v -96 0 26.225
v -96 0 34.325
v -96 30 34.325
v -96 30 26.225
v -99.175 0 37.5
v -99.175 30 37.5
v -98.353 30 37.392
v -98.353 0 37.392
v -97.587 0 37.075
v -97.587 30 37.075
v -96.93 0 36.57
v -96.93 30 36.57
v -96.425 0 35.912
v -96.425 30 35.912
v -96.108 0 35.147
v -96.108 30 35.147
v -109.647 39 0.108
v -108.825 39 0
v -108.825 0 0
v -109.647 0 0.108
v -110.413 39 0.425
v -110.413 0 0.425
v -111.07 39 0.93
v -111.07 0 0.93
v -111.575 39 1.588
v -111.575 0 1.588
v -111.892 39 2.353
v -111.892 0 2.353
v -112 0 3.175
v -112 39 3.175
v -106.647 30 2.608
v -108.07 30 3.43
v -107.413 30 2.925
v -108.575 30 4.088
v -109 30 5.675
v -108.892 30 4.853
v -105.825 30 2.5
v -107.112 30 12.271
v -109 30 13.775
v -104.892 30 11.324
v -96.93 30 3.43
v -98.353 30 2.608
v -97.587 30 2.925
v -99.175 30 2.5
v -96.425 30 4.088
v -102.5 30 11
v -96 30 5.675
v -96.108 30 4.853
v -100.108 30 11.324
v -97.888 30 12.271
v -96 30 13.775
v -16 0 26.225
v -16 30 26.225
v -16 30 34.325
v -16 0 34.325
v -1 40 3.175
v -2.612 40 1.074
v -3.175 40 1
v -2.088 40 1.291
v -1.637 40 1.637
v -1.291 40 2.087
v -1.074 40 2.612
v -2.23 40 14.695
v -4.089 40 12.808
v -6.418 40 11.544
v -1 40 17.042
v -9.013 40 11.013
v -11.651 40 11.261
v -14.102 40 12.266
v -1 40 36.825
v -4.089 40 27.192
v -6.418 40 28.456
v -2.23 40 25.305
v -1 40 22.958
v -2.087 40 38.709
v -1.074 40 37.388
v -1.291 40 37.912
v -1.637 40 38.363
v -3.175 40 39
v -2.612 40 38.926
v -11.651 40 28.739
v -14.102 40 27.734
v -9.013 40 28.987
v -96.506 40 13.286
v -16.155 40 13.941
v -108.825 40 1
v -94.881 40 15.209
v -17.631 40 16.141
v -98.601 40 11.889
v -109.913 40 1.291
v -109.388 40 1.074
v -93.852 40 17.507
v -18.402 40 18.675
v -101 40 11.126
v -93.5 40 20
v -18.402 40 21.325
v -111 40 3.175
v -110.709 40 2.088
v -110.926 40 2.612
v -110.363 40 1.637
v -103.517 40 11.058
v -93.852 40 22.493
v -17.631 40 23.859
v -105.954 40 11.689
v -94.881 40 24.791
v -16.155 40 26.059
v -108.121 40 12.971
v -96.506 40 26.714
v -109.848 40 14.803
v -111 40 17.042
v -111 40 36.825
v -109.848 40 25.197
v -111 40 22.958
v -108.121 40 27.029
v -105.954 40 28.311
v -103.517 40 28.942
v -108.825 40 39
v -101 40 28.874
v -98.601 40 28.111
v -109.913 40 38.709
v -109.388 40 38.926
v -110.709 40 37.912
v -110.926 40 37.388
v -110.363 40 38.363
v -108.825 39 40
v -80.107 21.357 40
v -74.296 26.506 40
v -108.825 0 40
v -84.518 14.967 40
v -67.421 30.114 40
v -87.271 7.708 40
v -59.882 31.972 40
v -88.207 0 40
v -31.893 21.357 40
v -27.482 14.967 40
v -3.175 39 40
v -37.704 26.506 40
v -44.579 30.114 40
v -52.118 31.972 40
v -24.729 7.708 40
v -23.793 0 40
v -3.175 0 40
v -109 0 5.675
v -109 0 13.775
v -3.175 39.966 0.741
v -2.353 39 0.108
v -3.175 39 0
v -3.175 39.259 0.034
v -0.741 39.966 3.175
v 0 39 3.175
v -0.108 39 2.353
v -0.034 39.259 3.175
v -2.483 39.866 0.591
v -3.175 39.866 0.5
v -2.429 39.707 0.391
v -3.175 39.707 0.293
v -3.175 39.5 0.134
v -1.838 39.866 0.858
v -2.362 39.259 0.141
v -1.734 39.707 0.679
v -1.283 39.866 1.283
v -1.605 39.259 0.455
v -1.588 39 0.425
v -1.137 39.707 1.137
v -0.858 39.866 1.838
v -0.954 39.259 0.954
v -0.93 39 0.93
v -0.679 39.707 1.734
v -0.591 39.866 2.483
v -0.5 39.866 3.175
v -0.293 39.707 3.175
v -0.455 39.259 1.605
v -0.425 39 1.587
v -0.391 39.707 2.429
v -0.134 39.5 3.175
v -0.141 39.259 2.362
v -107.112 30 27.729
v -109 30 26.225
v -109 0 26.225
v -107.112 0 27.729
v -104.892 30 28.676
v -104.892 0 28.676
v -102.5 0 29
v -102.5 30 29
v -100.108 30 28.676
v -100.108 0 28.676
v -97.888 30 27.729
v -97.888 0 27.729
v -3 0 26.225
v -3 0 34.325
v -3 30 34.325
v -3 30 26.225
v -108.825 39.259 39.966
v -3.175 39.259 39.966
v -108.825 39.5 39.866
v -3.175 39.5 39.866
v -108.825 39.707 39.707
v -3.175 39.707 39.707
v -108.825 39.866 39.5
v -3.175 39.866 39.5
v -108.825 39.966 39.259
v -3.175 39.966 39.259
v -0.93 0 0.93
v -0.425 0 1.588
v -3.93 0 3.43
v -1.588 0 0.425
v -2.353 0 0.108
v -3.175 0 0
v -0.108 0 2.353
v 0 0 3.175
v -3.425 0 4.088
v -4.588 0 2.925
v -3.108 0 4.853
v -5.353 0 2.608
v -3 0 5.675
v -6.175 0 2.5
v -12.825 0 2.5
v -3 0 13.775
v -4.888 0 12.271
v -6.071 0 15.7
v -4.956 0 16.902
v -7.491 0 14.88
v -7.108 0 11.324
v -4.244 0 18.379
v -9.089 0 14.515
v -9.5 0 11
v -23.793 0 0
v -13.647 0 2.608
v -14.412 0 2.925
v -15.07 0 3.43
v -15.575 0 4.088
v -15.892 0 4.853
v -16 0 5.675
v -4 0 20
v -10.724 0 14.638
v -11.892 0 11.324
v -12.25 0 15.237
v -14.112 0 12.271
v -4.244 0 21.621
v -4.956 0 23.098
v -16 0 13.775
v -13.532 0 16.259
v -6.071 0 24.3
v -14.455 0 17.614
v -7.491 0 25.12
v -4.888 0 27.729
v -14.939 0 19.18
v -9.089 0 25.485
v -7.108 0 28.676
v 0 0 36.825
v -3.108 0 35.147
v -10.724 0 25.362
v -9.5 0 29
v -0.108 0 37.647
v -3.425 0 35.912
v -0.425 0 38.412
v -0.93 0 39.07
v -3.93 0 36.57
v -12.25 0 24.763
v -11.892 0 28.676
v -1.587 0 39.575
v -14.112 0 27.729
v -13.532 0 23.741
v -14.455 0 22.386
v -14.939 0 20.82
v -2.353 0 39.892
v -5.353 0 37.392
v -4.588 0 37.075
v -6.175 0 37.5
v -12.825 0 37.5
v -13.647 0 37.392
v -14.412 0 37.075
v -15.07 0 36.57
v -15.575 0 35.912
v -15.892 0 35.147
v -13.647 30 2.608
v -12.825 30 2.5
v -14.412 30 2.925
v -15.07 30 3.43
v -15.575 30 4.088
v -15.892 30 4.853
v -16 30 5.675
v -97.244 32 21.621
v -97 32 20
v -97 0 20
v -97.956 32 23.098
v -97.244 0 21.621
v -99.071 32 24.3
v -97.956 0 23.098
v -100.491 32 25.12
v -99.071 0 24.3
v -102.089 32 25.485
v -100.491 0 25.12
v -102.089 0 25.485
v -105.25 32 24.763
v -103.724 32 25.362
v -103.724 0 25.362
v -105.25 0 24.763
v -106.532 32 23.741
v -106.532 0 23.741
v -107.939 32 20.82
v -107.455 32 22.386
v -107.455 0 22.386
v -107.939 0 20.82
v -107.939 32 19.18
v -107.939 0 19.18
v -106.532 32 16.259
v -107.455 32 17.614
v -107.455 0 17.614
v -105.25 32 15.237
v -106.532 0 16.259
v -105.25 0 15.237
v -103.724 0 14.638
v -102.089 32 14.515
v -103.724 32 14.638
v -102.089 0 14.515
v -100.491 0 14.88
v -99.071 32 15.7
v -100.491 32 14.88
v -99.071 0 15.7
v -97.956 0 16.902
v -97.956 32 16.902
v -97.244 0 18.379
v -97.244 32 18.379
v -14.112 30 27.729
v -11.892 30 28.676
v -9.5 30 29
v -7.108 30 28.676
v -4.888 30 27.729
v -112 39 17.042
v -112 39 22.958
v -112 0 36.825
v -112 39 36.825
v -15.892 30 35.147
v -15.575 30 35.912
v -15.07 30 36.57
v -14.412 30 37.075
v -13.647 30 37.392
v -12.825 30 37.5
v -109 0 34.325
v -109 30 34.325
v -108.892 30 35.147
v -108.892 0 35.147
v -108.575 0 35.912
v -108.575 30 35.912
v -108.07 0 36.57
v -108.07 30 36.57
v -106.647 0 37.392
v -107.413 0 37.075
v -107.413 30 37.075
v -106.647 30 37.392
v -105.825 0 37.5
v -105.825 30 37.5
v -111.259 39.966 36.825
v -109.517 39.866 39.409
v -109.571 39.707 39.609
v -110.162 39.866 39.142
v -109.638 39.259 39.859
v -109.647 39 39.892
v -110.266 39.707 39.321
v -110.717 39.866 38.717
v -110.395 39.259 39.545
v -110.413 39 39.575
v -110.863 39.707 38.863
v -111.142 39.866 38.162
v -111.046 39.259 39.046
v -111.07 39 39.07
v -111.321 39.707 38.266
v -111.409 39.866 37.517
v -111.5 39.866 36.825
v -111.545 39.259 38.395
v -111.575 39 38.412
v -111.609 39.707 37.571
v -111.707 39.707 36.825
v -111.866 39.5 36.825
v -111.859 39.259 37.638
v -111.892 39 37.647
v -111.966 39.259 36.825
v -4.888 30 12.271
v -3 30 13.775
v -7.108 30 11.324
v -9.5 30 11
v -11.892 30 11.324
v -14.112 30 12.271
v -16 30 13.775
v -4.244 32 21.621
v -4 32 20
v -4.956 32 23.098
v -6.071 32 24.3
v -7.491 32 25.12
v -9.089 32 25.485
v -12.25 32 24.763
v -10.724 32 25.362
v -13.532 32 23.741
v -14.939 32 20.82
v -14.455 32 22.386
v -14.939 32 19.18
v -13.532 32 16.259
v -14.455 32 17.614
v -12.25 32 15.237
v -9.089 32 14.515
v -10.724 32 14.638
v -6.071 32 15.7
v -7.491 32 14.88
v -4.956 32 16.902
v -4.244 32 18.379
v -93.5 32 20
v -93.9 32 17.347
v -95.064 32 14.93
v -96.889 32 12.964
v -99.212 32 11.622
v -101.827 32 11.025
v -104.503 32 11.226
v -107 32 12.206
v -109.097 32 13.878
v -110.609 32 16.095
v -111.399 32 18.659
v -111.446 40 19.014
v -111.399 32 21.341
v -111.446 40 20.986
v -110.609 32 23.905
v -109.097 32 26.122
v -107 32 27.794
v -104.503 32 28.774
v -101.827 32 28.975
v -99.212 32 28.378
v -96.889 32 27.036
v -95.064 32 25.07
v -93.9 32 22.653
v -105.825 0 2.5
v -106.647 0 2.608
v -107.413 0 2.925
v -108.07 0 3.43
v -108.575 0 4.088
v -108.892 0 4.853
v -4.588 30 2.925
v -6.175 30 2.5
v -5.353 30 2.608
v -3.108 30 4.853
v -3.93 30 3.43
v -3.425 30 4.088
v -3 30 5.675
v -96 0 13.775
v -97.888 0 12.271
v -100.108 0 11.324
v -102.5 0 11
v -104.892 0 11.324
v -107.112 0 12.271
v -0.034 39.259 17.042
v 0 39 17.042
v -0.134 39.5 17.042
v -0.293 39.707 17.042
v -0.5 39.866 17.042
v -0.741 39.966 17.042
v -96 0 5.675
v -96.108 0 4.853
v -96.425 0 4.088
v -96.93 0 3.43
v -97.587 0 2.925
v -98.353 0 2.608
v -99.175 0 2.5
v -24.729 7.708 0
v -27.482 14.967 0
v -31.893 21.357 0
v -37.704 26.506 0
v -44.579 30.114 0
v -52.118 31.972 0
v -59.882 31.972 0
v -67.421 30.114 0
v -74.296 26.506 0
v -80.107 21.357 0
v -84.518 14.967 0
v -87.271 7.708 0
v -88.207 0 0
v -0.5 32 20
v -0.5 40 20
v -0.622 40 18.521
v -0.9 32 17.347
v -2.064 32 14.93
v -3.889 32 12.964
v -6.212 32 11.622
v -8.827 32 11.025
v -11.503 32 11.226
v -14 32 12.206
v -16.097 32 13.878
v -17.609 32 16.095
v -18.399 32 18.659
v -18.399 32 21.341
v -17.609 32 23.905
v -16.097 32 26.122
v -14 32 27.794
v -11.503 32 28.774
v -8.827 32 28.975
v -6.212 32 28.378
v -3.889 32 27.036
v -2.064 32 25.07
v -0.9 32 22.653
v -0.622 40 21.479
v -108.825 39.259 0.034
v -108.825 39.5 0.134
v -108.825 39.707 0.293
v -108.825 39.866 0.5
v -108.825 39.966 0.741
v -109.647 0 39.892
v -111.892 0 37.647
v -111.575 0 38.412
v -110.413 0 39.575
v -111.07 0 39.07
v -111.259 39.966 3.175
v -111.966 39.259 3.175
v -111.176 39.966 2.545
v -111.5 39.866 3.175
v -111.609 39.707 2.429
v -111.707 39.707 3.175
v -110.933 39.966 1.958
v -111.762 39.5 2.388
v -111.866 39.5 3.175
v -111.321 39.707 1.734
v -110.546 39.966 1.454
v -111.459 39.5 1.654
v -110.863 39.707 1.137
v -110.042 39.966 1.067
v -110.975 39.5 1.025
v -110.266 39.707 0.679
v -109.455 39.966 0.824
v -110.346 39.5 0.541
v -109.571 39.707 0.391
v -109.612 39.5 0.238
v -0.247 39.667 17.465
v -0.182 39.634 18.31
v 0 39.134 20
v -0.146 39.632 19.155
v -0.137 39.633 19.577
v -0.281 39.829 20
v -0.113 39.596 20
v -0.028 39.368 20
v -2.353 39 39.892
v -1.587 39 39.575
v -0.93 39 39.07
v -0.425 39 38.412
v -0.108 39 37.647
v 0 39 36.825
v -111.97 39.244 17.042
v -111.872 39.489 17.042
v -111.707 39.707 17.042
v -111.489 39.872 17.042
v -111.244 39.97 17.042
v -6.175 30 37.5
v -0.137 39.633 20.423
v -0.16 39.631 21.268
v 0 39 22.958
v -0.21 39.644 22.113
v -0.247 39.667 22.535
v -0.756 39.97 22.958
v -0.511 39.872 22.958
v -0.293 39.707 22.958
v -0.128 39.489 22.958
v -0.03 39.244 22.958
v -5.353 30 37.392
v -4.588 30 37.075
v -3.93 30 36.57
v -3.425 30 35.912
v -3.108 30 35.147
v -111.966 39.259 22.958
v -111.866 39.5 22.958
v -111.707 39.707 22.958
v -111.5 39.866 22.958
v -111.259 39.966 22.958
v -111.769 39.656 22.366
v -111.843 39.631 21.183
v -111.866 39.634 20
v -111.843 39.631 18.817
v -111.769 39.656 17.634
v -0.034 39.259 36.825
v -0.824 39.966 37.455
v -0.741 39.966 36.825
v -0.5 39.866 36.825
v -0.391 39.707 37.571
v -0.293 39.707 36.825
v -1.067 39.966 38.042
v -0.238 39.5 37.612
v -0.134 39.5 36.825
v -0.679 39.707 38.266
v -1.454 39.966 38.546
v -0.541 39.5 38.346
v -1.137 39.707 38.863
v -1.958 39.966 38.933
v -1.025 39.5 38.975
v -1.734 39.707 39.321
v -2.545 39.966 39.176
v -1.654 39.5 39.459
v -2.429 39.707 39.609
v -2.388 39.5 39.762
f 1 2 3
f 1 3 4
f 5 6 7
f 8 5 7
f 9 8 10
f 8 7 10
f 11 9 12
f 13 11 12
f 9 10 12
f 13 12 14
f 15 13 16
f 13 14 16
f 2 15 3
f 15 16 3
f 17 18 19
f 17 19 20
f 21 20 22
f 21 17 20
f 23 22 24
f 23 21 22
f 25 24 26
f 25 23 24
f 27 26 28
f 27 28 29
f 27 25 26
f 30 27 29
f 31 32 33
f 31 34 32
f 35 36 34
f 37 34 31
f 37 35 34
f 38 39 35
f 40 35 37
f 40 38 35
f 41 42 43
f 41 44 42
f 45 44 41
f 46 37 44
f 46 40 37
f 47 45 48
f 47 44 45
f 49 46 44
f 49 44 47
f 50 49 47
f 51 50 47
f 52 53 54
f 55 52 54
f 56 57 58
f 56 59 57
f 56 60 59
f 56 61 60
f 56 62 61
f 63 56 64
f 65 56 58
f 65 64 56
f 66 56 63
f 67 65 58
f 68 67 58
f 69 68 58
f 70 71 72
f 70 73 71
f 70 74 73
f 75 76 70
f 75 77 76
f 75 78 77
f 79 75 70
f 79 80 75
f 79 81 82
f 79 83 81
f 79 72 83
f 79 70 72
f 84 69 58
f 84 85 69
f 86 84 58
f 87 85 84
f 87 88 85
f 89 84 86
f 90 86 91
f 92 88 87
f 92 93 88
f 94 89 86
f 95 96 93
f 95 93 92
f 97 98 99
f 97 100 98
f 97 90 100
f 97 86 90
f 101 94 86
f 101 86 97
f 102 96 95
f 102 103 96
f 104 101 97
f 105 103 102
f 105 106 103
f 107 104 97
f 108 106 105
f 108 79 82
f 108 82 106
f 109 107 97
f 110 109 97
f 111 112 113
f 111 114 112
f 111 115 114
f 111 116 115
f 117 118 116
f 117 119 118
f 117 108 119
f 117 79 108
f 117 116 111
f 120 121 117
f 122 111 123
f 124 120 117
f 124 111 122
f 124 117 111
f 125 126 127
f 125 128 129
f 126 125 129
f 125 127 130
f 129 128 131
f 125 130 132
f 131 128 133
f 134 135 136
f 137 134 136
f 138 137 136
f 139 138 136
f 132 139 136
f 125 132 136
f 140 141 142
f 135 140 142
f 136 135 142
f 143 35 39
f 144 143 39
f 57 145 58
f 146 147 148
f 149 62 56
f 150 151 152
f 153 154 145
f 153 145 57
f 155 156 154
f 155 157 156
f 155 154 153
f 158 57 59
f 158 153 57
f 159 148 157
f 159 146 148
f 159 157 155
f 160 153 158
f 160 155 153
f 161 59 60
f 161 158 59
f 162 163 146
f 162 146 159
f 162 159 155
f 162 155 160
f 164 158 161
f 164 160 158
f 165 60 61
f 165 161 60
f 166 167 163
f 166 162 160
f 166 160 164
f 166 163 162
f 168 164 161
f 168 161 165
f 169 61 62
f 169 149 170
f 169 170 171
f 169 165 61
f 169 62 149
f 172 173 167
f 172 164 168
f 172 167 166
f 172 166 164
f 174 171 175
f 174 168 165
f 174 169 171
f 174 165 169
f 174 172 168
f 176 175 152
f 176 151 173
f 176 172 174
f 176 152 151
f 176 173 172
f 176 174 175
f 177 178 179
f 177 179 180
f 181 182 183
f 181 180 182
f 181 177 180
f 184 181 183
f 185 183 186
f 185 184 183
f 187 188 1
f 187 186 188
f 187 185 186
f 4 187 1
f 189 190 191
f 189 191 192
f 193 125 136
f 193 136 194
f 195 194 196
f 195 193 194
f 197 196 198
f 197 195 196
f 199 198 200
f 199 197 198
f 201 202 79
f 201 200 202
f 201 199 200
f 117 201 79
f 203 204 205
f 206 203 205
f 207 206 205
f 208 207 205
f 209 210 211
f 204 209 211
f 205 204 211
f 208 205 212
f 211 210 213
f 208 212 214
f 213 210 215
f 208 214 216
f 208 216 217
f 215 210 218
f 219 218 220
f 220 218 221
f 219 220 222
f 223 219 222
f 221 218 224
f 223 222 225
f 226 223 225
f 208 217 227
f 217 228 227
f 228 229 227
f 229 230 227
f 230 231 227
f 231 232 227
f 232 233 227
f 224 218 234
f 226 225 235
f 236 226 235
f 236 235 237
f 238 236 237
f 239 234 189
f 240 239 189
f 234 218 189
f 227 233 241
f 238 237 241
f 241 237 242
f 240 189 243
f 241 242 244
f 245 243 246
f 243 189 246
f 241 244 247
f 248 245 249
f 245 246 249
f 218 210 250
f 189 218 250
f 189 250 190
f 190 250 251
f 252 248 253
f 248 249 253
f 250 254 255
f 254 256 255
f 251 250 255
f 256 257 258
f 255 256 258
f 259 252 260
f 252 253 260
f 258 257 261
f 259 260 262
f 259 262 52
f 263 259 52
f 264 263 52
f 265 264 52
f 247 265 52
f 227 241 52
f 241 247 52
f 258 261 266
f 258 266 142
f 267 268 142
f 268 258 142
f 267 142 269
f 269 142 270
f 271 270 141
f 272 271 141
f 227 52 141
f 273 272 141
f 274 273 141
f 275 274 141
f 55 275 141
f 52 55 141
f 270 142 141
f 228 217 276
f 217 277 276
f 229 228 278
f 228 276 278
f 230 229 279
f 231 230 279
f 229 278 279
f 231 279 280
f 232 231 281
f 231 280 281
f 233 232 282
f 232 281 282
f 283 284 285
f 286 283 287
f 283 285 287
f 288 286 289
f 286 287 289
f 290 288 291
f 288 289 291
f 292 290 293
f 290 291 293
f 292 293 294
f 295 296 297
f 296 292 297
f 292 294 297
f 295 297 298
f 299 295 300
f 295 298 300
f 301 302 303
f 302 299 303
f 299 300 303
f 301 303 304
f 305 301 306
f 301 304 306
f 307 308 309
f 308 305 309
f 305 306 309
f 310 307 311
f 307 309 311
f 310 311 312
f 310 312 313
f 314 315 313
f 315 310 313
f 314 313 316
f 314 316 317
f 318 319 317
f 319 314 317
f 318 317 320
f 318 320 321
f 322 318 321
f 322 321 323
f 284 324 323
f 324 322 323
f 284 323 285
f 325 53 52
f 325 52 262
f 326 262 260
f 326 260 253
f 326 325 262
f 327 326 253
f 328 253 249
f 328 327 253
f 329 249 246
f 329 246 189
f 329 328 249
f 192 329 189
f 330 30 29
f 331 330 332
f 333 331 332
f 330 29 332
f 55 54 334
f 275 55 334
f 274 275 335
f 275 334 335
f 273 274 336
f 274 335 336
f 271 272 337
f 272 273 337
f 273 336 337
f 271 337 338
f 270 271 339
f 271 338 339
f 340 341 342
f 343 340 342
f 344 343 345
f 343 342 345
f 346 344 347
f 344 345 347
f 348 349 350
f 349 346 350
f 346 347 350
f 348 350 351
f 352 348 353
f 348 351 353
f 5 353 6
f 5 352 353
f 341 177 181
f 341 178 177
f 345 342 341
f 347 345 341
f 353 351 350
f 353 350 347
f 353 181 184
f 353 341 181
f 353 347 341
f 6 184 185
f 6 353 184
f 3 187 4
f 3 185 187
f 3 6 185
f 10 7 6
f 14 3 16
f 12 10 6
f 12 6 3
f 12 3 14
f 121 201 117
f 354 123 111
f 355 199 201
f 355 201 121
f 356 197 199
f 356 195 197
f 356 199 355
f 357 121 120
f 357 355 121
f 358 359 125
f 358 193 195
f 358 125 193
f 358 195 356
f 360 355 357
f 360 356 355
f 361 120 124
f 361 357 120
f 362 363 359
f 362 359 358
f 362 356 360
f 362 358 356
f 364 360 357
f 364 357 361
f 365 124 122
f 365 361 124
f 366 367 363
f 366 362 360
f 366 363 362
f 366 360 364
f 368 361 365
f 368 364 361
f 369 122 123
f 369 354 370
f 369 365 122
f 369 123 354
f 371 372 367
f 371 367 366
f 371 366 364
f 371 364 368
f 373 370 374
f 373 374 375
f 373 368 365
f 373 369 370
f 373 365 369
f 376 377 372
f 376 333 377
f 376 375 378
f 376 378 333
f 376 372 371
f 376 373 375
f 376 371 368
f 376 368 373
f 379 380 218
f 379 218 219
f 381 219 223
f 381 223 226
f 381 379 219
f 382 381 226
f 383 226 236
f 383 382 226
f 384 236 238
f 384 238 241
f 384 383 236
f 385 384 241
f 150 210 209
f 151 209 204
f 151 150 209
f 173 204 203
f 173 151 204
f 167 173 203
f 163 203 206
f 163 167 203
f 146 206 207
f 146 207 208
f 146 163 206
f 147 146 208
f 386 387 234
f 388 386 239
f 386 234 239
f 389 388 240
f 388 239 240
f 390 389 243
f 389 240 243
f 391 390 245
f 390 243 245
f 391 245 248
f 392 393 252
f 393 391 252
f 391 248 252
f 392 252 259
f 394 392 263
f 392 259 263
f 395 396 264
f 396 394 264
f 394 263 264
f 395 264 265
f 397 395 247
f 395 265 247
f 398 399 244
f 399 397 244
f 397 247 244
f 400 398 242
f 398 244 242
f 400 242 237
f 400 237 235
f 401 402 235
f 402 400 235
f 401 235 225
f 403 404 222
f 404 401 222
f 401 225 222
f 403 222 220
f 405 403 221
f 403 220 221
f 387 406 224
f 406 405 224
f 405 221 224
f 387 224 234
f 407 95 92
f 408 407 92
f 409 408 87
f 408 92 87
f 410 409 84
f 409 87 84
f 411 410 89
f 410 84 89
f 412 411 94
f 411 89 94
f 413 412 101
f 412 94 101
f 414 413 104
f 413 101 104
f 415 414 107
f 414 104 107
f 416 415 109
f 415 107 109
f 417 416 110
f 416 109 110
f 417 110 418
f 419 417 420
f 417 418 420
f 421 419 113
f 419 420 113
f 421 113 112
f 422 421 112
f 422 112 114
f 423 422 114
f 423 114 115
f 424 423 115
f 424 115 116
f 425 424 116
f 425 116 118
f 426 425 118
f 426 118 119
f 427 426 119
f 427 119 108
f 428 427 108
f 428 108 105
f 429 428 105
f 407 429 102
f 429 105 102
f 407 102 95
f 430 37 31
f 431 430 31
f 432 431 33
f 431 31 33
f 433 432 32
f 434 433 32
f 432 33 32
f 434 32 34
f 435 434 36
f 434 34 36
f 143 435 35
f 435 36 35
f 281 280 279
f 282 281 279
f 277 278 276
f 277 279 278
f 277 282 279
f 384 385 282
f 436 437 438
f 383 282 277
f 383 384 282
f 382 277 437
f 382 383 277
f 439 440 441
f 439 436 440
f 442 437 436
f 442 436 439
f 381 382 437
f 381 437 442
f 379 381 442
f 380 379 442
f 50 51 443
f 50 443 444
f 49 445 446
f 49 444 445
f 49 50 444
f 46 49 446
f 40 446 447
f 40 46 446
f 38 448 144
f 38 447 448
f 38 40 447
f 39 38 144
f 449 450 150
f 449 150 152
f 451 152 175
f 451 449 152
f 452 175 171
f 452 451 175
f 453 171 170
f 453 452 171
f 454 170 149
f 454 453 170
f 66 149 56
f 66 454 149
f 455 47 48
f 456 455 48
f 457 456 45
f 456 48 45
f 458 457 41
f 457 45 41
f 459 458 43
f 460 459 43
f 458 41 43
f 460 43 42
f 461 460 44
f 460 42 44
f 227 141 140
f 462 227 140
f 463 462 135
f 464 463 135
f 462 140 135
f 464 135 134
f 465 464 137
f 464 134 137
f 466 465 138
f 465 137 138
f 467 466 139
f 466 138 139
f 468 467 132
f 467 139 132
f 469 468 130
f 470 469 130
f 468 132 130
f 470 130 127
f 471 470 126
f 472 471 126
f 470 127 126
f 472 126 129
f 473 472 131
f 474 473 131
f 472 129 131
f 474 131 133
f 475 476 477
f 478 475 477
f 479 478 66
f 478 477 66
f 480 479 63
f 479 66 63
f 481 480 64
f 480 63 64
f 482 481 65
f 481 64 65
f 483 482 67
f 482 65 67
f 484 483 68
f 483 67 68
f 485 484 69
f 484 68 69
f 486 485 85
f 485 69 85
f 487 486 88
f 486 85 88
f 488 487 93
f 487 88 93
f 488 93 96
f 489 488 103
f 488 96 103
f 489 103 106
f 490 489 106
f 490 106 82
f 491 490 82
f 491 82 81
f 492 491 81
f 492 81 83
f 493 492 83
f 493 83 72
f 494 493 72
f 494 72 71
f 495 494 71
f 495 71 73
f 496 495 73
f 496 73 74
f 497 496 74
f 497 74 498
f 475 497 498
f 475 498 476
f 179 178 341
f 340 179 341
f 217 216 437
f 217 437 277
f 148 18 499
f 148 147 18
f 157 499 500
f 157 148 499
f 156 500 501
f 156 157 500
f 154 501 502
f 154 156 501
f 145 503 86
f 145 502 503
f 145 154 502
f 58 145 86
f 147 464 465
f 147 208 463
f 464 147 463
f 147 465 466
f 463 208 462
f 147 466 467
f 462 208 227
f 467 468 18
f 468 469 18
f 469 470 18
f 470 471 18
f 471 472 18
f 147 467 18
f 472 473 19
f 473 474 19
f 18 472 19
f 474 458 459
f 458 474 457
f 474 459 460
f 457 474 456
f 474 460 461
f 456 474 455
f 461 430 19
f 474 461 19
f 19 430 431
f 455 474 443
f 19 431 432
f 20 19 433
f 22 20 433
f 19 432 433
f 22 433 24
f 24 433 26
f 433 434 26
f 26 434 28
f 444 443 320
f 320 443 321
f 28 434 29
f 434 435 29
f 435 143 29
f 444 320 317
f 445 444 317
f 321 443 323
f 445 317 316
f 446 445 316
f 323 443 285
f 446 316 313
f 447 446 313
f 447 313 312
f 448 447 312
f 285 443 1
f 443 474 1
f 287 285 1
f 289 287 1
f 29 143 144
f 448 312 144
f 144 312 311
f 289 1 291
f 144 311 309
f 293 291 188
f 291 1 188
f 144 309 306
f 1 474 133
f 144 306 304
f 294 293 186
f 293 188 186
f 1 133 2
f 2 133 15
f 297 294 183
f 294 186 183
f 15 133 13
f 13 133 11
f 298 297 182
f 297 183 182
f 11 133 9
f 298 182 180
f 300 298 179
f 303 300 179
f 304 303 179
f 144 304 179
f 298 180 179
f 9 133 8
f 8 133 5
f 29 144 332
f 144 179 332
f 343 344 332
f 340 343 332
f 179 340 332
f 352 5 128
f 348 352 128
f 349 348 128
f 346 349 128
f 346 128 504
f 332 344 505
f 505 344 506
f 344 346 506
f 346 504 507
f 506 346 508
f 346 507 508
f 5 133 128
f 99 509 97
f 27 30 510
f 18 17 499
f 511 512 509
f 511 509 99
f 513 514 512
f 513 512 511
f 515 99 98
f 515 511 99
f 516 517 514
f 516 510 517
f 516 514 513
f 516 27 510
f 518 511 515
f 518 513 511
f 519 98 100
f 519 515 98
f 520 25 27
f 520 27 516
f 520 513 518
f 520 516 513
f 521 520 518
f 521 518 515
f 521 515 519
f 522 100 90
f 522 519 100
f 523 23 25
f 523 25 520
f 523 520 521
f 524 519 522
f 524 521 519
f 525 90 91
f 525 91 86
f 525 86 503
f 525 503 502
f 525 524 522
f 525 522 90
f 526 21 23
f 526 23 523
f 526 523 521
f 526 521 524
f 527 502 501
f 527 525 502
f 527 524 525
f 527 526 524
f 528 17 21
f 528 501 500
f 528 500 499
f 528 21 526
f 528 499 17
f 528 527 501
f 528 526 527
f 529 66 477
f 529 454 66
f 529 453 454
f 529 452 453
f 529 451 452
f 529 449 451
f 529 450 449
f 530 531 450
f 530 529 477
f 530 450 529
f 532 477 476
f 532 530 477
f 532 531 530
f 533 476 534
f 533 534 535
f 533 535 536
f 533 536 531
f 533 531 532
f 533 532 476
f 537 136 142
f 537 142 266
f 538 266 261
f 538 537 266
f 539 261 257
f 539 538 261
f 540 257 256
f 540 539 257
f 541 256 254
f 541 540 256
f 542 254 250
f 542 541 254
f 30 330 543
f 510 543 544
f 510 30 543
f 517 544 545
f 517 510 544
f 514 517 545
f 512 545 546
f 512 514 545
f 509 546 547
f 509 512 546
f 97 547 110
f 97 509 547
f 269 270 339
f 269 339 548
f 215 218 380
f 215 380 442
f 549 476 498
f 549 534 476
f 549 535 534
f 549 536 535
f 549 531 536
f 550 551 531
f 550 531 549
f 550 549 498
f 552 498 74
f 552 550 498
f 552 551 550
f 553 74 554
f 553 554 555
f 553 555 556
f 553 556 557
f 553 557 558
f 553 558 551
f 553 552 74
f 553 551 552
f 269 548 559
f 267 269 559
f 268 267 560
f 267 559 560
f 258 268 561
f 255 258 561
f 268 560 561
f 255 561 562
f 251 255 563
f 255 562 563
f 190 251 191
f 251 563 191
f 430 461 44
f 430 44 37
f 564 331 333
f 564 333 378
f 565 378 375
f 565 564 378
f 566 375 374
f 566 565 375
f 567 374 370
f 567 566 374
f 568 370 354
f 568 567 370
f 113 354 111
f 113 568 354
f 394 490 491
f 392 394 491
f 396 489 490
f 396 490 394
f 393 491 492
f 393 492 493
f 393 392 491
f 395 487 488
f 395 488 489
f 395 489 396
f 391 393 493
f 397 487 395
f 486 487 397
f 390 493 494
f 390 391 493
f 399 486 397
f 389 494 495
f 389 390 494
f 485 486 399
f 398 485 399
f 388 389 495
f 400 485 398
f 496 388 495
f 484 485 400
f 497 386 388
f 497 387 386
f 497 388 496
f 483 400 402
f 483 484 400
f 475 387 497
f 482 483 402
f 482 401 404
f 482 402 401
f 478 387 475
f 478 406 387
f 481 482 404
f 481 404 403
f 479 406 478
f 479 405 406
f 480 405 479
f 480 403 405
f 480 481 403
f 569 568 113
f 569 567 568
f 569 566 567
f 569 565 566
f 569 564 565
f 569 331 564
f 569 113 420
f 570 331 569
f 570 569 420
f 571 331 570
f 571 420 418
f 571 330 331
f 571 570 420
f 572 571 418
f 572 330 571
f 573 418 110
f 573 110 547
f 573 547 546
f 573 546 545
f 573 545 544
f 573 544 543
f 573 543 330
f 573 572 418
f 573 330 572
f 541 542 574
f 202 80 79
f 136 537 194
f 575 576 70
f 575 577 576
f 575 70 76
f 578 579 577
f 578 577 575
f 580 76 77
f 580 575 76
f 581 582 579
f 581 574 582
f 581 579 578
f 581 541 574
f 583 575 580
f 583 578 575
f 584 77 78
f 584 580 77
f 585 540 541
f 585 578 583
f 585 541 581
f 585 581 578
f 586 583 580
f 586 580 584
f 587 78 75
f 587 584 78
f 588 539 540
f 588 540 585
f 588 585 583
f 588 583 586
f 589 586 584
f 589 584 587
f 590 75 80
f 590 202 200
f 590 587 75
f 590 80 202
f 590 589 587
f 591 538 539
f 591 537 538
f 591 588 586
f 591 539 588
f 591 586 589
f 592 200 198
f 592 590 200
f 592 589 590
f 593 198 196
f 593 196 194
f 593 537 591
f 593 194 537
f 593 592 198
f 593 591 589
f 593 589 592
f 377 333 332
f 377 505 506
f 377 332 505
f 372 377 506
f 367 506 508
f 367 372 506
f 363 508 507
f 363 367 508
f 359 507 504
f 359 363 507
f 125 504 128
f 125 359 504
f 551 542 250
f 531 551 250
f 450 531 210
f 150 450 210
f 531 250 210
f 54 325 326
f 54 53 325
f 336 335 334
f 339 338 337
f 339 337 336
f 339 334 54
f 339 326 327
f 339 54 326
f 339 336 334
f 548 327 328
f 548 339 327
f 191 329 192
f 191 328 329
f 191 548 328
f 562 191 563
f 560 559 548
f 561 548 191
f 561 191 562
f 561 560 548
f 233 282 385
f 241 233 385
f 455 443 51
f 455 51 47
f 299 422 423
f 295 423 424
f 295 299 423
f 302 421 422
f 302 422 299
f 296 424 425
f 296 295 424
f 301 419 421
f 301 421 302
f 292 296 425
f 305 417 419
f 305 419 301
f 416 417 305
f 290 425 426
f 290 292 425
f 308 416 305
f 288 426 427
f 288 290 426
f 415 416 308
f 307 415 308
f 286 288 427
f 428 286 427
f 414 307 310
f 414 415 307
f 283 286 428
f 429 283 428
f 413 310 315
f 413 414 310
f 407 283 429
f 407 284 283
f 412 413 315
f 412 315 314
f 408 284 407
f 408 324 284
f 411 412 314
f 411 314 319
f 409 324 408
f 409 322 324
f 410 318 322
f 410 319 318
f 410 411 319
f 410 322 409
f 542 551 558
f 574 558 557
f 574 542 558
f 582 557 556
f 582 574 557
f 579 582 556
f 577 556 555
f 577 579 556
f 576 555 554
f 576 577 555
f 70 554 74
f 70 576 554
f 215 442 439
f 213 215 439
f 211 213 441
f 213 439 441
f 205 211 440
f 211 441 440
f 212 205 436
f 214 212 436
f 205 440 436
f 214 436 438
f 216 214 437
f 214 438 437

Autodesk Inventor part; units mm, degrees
ref_plane "YZ Plane" through (0, 0, 0) normal (1, 0, 0) x (0, 1, 0)
ref_plane "XZ Plane" through (0, 0, 0) normal (0, 1, 0) x (-1, 0, 0)
ref_plane "XY Plane" through (0, 0, 0) normal (0, 0, 1) x (1, 0, 0)
sketch "Sketch13" plane through (0, 0, 0) normal (0, 1, 0) x (-1, 0, 0)
  line L0 (0, 0) -> (112, 0)
  line L1 (112, 0) -> (112, 40)
  line L2 (112, 40) -> (0, 40)
  line L3 (0, 40) -> (0, 0)
  dimension "d51" = 112
  dimension "d52" = 40
extrude "Extrusion11" add sketch "Sketch13" along normal blind 40
sketch "Sketch14" plane through (-112, 0, 40) normal (0, 0, 1) x (1, 0, 0)
  line L0 (0, 0) -> (0, 40) projected
  arc A0 (88.2072, 0) -> (23.7928, 0) centre (56, 0) ccw
  line L1 (23.7928, 0) -> (88.2072, 0)
  dimension "d88" = 32.2072
extrude "Extrusion12" cut sketch "Sketch14" against normal blind 40
sketch "Sketch15" plane through (0, 0, 0) normal (0, -1, 0) x (1, 0, 0)
  line L0 (-88.2072, 0) -> (-88.2072, 40) projected
  line L1 (-112, 40) -> (-88.2072, 40) projected
  line L2 (-112, 0) -> (-112, 40) projected
  line L3 (-88.2072, 0) -> (-112, 0) projected
  line L4 (-100.1315, 0) -> (-100.1315, 2.5) construction
  line L5 (-101.9977, 40) -> (-101.9977, 37.5) construction
  line L6 (-112, 20) -> (-109, 20) construction
  line L7 (-88.2072, 20) -> (-94.2072, 20) construction
  line L8 (-109, 37.5) -> (-96, 37.5)
  line L9 (-96, 37.5) -> (-96, 2.5)
  line L10 (-96, 2.5) -> (-109, 2.5)
  line L11 (-109, 2.5) -> (-109, 37.5)
  line L12 (-23.7928, 40) -> (-23.7928, 0) projected
  line L13 (-23.7928, 40) -> (-23.7928, 0) projected
  line L14 (0, 0) -> (-23.7928, 0) projected
  line L15 (0, 40) -> (0, 0) projected
  line L16 (-23.7928, 40) -> (0, 40) projected
  line L17 (0, 20) -> (-3, 20) construction
  line L18 (-11.8964, 0) -> (-11.8964, 2.5) construction
  line L19 (-11.8964, 40) -> (-11.8964, 37.5) construction
  line L20 (-23.7928, 20) -> (-17.7928, 20) construction
  line L21 (-16, 37.5) -> (-3, 37.5)
  line L22 (-3, 37.5) -> (-3, 2.5)
  line L23 (-3, 2.5) -> (-16, 2.5)
  line L24 (-16, 2.5) -> (-16, 37.5)
  dimension "d60" = 2.5
  dimension "d62" = 2.5
  dimension "d63" = 3
  dimension "d64" = 6
  dimension "d65" = 3
  dimension "d66" = 2.5
  dimension "d67" = 2.5
  dimension "d68" = 6
extrude "Extrusion13" cut sketch "Sketch15" against normal blind 30 contours L8 L9 L10 L11 | L21 L22 L23 L24
sketch "Sketch16" plane through (0, 30, 0) normal (0, -1, 0) x (1, 0, 0)
  line L0 (-16, 37.5) -> (-3, 37.5) projected
  line L1 (-16, 2.5) -> (-16, 37.5) projected
  line L2 (-3, 2.5) -> (-16, 2.5) projected
  line L3 (-3, 37.5) -> (-3, 2.5) projected
  circle A0 centre (-102.5, 20) radius 9
  circle A1 centre (-9.5, 20) radius 9
  point P0 (0, 0)
  dimension "d71" = 18
  dimension "d72" = 18
extrude "Extrusion14" add sketch "Sketch16" along normal blind 30 contours A1 L3 L1 | L1 A1 | A1 L3 | A0
sketch "Sketch17" plane through (0, 0, 0) normal (0, -1, 0) x (1, 0, 0)
  arc A0 (-109, 13.7751) -> (-96, 13.7751) centre (-102.5, 20) ccw projected
  line L0 (-16, 26.2249) -> (-16, 37.5) projected
  line L1 (-16, 37.5) -> (-3, 37.5) projected
  line L2 (-3, 37.5) -> (-3, 26.2249) projected
  arc A1 (-3, 26.2249) -> (-16, 26.2249) centre (-9.5, 20) ccw projected
  line L3 (-23.7928, 40) -> (-23.7928, 0) projected
  line L4 (0, 0) -> (-23.7928, 0) projected
  line L5 (0, 40) -> (0, 0) projected
  line L6 (-23.7928, 40) -> (0, 40) projected
  arc A2 (-16, 13.7751) -> (-3, 13.7751) centre (-9.5, 20) ccw projected
  line L7 (-3, 13.7751) -> (-3, 2.5) projected
  line L8 (-3, 2.5) -> (-16, 2.5) projected
  line L9 (-16, 2.5) -> (-16, 13.7751) projected
  circle A3 centre (-102.5, 20) radius 5.5
  circle A4 centre (-9.5, 20) radius 5.5
  dimension "d75" = 11
  dimension "d76" = 11
extrude "Extrusion15" cut sketch "Sketch17" against normal blind 76.2 contours A3 | A4
sketch "Sketch18" plane through (0, 40, 0) normal (0, 1, 0) x (1, 0, 0)
  circle A0 centre (-102.5, -20) radius 5.5 projected
  circle A1 centre (-9.5, -20) radius 5.5 projected
  circle A2 centre (-102.5, -20) radius 9
  circle A3 centre (-9.5, -20) radius 9
  dimension "d79" = 18
  dimension "d81" = 18
extrude "Extrusion16" cut sketch "Sketch18" against normal blind 8
fillet "Fillet3" radius 3.175 6 edges at (-16, 15, 2.5) (-3, 15, 2.5) (-16, 15, 37.5) (-3, 15, 37.5) (0, 20, 40) (0, 20, 0)
fillet "Fillet4" radius 3.175 6 edges at (-112, 20, 0) (-112, 20, 40) (-109, 15, 37.5) (-109, 15, 2.5) (-96, 15, 2.5) (-96, 15, 37.5)
fillet "Fillet5" radius 1 8 edges at (-0.9299, 40, 39.0701) (0, 40, 20) (-0.9299, 40, 0.9299) (-56, 40, 0) (-111.0701, 40, 0.9299) (-112, 40, 20) (-111.0701, 40, 39.0701) (-56, 40, 40)
equation "\"d62\" = d60"
equation "\"d65\" = d63"
equation "\"d66\" = d60"
equation "\"d67\" = d66"
equation "\"d68\" = d64"
equation "\"d81\" = d79"
properties part number "2.5 CIM mount" material "ABS Plastic"
